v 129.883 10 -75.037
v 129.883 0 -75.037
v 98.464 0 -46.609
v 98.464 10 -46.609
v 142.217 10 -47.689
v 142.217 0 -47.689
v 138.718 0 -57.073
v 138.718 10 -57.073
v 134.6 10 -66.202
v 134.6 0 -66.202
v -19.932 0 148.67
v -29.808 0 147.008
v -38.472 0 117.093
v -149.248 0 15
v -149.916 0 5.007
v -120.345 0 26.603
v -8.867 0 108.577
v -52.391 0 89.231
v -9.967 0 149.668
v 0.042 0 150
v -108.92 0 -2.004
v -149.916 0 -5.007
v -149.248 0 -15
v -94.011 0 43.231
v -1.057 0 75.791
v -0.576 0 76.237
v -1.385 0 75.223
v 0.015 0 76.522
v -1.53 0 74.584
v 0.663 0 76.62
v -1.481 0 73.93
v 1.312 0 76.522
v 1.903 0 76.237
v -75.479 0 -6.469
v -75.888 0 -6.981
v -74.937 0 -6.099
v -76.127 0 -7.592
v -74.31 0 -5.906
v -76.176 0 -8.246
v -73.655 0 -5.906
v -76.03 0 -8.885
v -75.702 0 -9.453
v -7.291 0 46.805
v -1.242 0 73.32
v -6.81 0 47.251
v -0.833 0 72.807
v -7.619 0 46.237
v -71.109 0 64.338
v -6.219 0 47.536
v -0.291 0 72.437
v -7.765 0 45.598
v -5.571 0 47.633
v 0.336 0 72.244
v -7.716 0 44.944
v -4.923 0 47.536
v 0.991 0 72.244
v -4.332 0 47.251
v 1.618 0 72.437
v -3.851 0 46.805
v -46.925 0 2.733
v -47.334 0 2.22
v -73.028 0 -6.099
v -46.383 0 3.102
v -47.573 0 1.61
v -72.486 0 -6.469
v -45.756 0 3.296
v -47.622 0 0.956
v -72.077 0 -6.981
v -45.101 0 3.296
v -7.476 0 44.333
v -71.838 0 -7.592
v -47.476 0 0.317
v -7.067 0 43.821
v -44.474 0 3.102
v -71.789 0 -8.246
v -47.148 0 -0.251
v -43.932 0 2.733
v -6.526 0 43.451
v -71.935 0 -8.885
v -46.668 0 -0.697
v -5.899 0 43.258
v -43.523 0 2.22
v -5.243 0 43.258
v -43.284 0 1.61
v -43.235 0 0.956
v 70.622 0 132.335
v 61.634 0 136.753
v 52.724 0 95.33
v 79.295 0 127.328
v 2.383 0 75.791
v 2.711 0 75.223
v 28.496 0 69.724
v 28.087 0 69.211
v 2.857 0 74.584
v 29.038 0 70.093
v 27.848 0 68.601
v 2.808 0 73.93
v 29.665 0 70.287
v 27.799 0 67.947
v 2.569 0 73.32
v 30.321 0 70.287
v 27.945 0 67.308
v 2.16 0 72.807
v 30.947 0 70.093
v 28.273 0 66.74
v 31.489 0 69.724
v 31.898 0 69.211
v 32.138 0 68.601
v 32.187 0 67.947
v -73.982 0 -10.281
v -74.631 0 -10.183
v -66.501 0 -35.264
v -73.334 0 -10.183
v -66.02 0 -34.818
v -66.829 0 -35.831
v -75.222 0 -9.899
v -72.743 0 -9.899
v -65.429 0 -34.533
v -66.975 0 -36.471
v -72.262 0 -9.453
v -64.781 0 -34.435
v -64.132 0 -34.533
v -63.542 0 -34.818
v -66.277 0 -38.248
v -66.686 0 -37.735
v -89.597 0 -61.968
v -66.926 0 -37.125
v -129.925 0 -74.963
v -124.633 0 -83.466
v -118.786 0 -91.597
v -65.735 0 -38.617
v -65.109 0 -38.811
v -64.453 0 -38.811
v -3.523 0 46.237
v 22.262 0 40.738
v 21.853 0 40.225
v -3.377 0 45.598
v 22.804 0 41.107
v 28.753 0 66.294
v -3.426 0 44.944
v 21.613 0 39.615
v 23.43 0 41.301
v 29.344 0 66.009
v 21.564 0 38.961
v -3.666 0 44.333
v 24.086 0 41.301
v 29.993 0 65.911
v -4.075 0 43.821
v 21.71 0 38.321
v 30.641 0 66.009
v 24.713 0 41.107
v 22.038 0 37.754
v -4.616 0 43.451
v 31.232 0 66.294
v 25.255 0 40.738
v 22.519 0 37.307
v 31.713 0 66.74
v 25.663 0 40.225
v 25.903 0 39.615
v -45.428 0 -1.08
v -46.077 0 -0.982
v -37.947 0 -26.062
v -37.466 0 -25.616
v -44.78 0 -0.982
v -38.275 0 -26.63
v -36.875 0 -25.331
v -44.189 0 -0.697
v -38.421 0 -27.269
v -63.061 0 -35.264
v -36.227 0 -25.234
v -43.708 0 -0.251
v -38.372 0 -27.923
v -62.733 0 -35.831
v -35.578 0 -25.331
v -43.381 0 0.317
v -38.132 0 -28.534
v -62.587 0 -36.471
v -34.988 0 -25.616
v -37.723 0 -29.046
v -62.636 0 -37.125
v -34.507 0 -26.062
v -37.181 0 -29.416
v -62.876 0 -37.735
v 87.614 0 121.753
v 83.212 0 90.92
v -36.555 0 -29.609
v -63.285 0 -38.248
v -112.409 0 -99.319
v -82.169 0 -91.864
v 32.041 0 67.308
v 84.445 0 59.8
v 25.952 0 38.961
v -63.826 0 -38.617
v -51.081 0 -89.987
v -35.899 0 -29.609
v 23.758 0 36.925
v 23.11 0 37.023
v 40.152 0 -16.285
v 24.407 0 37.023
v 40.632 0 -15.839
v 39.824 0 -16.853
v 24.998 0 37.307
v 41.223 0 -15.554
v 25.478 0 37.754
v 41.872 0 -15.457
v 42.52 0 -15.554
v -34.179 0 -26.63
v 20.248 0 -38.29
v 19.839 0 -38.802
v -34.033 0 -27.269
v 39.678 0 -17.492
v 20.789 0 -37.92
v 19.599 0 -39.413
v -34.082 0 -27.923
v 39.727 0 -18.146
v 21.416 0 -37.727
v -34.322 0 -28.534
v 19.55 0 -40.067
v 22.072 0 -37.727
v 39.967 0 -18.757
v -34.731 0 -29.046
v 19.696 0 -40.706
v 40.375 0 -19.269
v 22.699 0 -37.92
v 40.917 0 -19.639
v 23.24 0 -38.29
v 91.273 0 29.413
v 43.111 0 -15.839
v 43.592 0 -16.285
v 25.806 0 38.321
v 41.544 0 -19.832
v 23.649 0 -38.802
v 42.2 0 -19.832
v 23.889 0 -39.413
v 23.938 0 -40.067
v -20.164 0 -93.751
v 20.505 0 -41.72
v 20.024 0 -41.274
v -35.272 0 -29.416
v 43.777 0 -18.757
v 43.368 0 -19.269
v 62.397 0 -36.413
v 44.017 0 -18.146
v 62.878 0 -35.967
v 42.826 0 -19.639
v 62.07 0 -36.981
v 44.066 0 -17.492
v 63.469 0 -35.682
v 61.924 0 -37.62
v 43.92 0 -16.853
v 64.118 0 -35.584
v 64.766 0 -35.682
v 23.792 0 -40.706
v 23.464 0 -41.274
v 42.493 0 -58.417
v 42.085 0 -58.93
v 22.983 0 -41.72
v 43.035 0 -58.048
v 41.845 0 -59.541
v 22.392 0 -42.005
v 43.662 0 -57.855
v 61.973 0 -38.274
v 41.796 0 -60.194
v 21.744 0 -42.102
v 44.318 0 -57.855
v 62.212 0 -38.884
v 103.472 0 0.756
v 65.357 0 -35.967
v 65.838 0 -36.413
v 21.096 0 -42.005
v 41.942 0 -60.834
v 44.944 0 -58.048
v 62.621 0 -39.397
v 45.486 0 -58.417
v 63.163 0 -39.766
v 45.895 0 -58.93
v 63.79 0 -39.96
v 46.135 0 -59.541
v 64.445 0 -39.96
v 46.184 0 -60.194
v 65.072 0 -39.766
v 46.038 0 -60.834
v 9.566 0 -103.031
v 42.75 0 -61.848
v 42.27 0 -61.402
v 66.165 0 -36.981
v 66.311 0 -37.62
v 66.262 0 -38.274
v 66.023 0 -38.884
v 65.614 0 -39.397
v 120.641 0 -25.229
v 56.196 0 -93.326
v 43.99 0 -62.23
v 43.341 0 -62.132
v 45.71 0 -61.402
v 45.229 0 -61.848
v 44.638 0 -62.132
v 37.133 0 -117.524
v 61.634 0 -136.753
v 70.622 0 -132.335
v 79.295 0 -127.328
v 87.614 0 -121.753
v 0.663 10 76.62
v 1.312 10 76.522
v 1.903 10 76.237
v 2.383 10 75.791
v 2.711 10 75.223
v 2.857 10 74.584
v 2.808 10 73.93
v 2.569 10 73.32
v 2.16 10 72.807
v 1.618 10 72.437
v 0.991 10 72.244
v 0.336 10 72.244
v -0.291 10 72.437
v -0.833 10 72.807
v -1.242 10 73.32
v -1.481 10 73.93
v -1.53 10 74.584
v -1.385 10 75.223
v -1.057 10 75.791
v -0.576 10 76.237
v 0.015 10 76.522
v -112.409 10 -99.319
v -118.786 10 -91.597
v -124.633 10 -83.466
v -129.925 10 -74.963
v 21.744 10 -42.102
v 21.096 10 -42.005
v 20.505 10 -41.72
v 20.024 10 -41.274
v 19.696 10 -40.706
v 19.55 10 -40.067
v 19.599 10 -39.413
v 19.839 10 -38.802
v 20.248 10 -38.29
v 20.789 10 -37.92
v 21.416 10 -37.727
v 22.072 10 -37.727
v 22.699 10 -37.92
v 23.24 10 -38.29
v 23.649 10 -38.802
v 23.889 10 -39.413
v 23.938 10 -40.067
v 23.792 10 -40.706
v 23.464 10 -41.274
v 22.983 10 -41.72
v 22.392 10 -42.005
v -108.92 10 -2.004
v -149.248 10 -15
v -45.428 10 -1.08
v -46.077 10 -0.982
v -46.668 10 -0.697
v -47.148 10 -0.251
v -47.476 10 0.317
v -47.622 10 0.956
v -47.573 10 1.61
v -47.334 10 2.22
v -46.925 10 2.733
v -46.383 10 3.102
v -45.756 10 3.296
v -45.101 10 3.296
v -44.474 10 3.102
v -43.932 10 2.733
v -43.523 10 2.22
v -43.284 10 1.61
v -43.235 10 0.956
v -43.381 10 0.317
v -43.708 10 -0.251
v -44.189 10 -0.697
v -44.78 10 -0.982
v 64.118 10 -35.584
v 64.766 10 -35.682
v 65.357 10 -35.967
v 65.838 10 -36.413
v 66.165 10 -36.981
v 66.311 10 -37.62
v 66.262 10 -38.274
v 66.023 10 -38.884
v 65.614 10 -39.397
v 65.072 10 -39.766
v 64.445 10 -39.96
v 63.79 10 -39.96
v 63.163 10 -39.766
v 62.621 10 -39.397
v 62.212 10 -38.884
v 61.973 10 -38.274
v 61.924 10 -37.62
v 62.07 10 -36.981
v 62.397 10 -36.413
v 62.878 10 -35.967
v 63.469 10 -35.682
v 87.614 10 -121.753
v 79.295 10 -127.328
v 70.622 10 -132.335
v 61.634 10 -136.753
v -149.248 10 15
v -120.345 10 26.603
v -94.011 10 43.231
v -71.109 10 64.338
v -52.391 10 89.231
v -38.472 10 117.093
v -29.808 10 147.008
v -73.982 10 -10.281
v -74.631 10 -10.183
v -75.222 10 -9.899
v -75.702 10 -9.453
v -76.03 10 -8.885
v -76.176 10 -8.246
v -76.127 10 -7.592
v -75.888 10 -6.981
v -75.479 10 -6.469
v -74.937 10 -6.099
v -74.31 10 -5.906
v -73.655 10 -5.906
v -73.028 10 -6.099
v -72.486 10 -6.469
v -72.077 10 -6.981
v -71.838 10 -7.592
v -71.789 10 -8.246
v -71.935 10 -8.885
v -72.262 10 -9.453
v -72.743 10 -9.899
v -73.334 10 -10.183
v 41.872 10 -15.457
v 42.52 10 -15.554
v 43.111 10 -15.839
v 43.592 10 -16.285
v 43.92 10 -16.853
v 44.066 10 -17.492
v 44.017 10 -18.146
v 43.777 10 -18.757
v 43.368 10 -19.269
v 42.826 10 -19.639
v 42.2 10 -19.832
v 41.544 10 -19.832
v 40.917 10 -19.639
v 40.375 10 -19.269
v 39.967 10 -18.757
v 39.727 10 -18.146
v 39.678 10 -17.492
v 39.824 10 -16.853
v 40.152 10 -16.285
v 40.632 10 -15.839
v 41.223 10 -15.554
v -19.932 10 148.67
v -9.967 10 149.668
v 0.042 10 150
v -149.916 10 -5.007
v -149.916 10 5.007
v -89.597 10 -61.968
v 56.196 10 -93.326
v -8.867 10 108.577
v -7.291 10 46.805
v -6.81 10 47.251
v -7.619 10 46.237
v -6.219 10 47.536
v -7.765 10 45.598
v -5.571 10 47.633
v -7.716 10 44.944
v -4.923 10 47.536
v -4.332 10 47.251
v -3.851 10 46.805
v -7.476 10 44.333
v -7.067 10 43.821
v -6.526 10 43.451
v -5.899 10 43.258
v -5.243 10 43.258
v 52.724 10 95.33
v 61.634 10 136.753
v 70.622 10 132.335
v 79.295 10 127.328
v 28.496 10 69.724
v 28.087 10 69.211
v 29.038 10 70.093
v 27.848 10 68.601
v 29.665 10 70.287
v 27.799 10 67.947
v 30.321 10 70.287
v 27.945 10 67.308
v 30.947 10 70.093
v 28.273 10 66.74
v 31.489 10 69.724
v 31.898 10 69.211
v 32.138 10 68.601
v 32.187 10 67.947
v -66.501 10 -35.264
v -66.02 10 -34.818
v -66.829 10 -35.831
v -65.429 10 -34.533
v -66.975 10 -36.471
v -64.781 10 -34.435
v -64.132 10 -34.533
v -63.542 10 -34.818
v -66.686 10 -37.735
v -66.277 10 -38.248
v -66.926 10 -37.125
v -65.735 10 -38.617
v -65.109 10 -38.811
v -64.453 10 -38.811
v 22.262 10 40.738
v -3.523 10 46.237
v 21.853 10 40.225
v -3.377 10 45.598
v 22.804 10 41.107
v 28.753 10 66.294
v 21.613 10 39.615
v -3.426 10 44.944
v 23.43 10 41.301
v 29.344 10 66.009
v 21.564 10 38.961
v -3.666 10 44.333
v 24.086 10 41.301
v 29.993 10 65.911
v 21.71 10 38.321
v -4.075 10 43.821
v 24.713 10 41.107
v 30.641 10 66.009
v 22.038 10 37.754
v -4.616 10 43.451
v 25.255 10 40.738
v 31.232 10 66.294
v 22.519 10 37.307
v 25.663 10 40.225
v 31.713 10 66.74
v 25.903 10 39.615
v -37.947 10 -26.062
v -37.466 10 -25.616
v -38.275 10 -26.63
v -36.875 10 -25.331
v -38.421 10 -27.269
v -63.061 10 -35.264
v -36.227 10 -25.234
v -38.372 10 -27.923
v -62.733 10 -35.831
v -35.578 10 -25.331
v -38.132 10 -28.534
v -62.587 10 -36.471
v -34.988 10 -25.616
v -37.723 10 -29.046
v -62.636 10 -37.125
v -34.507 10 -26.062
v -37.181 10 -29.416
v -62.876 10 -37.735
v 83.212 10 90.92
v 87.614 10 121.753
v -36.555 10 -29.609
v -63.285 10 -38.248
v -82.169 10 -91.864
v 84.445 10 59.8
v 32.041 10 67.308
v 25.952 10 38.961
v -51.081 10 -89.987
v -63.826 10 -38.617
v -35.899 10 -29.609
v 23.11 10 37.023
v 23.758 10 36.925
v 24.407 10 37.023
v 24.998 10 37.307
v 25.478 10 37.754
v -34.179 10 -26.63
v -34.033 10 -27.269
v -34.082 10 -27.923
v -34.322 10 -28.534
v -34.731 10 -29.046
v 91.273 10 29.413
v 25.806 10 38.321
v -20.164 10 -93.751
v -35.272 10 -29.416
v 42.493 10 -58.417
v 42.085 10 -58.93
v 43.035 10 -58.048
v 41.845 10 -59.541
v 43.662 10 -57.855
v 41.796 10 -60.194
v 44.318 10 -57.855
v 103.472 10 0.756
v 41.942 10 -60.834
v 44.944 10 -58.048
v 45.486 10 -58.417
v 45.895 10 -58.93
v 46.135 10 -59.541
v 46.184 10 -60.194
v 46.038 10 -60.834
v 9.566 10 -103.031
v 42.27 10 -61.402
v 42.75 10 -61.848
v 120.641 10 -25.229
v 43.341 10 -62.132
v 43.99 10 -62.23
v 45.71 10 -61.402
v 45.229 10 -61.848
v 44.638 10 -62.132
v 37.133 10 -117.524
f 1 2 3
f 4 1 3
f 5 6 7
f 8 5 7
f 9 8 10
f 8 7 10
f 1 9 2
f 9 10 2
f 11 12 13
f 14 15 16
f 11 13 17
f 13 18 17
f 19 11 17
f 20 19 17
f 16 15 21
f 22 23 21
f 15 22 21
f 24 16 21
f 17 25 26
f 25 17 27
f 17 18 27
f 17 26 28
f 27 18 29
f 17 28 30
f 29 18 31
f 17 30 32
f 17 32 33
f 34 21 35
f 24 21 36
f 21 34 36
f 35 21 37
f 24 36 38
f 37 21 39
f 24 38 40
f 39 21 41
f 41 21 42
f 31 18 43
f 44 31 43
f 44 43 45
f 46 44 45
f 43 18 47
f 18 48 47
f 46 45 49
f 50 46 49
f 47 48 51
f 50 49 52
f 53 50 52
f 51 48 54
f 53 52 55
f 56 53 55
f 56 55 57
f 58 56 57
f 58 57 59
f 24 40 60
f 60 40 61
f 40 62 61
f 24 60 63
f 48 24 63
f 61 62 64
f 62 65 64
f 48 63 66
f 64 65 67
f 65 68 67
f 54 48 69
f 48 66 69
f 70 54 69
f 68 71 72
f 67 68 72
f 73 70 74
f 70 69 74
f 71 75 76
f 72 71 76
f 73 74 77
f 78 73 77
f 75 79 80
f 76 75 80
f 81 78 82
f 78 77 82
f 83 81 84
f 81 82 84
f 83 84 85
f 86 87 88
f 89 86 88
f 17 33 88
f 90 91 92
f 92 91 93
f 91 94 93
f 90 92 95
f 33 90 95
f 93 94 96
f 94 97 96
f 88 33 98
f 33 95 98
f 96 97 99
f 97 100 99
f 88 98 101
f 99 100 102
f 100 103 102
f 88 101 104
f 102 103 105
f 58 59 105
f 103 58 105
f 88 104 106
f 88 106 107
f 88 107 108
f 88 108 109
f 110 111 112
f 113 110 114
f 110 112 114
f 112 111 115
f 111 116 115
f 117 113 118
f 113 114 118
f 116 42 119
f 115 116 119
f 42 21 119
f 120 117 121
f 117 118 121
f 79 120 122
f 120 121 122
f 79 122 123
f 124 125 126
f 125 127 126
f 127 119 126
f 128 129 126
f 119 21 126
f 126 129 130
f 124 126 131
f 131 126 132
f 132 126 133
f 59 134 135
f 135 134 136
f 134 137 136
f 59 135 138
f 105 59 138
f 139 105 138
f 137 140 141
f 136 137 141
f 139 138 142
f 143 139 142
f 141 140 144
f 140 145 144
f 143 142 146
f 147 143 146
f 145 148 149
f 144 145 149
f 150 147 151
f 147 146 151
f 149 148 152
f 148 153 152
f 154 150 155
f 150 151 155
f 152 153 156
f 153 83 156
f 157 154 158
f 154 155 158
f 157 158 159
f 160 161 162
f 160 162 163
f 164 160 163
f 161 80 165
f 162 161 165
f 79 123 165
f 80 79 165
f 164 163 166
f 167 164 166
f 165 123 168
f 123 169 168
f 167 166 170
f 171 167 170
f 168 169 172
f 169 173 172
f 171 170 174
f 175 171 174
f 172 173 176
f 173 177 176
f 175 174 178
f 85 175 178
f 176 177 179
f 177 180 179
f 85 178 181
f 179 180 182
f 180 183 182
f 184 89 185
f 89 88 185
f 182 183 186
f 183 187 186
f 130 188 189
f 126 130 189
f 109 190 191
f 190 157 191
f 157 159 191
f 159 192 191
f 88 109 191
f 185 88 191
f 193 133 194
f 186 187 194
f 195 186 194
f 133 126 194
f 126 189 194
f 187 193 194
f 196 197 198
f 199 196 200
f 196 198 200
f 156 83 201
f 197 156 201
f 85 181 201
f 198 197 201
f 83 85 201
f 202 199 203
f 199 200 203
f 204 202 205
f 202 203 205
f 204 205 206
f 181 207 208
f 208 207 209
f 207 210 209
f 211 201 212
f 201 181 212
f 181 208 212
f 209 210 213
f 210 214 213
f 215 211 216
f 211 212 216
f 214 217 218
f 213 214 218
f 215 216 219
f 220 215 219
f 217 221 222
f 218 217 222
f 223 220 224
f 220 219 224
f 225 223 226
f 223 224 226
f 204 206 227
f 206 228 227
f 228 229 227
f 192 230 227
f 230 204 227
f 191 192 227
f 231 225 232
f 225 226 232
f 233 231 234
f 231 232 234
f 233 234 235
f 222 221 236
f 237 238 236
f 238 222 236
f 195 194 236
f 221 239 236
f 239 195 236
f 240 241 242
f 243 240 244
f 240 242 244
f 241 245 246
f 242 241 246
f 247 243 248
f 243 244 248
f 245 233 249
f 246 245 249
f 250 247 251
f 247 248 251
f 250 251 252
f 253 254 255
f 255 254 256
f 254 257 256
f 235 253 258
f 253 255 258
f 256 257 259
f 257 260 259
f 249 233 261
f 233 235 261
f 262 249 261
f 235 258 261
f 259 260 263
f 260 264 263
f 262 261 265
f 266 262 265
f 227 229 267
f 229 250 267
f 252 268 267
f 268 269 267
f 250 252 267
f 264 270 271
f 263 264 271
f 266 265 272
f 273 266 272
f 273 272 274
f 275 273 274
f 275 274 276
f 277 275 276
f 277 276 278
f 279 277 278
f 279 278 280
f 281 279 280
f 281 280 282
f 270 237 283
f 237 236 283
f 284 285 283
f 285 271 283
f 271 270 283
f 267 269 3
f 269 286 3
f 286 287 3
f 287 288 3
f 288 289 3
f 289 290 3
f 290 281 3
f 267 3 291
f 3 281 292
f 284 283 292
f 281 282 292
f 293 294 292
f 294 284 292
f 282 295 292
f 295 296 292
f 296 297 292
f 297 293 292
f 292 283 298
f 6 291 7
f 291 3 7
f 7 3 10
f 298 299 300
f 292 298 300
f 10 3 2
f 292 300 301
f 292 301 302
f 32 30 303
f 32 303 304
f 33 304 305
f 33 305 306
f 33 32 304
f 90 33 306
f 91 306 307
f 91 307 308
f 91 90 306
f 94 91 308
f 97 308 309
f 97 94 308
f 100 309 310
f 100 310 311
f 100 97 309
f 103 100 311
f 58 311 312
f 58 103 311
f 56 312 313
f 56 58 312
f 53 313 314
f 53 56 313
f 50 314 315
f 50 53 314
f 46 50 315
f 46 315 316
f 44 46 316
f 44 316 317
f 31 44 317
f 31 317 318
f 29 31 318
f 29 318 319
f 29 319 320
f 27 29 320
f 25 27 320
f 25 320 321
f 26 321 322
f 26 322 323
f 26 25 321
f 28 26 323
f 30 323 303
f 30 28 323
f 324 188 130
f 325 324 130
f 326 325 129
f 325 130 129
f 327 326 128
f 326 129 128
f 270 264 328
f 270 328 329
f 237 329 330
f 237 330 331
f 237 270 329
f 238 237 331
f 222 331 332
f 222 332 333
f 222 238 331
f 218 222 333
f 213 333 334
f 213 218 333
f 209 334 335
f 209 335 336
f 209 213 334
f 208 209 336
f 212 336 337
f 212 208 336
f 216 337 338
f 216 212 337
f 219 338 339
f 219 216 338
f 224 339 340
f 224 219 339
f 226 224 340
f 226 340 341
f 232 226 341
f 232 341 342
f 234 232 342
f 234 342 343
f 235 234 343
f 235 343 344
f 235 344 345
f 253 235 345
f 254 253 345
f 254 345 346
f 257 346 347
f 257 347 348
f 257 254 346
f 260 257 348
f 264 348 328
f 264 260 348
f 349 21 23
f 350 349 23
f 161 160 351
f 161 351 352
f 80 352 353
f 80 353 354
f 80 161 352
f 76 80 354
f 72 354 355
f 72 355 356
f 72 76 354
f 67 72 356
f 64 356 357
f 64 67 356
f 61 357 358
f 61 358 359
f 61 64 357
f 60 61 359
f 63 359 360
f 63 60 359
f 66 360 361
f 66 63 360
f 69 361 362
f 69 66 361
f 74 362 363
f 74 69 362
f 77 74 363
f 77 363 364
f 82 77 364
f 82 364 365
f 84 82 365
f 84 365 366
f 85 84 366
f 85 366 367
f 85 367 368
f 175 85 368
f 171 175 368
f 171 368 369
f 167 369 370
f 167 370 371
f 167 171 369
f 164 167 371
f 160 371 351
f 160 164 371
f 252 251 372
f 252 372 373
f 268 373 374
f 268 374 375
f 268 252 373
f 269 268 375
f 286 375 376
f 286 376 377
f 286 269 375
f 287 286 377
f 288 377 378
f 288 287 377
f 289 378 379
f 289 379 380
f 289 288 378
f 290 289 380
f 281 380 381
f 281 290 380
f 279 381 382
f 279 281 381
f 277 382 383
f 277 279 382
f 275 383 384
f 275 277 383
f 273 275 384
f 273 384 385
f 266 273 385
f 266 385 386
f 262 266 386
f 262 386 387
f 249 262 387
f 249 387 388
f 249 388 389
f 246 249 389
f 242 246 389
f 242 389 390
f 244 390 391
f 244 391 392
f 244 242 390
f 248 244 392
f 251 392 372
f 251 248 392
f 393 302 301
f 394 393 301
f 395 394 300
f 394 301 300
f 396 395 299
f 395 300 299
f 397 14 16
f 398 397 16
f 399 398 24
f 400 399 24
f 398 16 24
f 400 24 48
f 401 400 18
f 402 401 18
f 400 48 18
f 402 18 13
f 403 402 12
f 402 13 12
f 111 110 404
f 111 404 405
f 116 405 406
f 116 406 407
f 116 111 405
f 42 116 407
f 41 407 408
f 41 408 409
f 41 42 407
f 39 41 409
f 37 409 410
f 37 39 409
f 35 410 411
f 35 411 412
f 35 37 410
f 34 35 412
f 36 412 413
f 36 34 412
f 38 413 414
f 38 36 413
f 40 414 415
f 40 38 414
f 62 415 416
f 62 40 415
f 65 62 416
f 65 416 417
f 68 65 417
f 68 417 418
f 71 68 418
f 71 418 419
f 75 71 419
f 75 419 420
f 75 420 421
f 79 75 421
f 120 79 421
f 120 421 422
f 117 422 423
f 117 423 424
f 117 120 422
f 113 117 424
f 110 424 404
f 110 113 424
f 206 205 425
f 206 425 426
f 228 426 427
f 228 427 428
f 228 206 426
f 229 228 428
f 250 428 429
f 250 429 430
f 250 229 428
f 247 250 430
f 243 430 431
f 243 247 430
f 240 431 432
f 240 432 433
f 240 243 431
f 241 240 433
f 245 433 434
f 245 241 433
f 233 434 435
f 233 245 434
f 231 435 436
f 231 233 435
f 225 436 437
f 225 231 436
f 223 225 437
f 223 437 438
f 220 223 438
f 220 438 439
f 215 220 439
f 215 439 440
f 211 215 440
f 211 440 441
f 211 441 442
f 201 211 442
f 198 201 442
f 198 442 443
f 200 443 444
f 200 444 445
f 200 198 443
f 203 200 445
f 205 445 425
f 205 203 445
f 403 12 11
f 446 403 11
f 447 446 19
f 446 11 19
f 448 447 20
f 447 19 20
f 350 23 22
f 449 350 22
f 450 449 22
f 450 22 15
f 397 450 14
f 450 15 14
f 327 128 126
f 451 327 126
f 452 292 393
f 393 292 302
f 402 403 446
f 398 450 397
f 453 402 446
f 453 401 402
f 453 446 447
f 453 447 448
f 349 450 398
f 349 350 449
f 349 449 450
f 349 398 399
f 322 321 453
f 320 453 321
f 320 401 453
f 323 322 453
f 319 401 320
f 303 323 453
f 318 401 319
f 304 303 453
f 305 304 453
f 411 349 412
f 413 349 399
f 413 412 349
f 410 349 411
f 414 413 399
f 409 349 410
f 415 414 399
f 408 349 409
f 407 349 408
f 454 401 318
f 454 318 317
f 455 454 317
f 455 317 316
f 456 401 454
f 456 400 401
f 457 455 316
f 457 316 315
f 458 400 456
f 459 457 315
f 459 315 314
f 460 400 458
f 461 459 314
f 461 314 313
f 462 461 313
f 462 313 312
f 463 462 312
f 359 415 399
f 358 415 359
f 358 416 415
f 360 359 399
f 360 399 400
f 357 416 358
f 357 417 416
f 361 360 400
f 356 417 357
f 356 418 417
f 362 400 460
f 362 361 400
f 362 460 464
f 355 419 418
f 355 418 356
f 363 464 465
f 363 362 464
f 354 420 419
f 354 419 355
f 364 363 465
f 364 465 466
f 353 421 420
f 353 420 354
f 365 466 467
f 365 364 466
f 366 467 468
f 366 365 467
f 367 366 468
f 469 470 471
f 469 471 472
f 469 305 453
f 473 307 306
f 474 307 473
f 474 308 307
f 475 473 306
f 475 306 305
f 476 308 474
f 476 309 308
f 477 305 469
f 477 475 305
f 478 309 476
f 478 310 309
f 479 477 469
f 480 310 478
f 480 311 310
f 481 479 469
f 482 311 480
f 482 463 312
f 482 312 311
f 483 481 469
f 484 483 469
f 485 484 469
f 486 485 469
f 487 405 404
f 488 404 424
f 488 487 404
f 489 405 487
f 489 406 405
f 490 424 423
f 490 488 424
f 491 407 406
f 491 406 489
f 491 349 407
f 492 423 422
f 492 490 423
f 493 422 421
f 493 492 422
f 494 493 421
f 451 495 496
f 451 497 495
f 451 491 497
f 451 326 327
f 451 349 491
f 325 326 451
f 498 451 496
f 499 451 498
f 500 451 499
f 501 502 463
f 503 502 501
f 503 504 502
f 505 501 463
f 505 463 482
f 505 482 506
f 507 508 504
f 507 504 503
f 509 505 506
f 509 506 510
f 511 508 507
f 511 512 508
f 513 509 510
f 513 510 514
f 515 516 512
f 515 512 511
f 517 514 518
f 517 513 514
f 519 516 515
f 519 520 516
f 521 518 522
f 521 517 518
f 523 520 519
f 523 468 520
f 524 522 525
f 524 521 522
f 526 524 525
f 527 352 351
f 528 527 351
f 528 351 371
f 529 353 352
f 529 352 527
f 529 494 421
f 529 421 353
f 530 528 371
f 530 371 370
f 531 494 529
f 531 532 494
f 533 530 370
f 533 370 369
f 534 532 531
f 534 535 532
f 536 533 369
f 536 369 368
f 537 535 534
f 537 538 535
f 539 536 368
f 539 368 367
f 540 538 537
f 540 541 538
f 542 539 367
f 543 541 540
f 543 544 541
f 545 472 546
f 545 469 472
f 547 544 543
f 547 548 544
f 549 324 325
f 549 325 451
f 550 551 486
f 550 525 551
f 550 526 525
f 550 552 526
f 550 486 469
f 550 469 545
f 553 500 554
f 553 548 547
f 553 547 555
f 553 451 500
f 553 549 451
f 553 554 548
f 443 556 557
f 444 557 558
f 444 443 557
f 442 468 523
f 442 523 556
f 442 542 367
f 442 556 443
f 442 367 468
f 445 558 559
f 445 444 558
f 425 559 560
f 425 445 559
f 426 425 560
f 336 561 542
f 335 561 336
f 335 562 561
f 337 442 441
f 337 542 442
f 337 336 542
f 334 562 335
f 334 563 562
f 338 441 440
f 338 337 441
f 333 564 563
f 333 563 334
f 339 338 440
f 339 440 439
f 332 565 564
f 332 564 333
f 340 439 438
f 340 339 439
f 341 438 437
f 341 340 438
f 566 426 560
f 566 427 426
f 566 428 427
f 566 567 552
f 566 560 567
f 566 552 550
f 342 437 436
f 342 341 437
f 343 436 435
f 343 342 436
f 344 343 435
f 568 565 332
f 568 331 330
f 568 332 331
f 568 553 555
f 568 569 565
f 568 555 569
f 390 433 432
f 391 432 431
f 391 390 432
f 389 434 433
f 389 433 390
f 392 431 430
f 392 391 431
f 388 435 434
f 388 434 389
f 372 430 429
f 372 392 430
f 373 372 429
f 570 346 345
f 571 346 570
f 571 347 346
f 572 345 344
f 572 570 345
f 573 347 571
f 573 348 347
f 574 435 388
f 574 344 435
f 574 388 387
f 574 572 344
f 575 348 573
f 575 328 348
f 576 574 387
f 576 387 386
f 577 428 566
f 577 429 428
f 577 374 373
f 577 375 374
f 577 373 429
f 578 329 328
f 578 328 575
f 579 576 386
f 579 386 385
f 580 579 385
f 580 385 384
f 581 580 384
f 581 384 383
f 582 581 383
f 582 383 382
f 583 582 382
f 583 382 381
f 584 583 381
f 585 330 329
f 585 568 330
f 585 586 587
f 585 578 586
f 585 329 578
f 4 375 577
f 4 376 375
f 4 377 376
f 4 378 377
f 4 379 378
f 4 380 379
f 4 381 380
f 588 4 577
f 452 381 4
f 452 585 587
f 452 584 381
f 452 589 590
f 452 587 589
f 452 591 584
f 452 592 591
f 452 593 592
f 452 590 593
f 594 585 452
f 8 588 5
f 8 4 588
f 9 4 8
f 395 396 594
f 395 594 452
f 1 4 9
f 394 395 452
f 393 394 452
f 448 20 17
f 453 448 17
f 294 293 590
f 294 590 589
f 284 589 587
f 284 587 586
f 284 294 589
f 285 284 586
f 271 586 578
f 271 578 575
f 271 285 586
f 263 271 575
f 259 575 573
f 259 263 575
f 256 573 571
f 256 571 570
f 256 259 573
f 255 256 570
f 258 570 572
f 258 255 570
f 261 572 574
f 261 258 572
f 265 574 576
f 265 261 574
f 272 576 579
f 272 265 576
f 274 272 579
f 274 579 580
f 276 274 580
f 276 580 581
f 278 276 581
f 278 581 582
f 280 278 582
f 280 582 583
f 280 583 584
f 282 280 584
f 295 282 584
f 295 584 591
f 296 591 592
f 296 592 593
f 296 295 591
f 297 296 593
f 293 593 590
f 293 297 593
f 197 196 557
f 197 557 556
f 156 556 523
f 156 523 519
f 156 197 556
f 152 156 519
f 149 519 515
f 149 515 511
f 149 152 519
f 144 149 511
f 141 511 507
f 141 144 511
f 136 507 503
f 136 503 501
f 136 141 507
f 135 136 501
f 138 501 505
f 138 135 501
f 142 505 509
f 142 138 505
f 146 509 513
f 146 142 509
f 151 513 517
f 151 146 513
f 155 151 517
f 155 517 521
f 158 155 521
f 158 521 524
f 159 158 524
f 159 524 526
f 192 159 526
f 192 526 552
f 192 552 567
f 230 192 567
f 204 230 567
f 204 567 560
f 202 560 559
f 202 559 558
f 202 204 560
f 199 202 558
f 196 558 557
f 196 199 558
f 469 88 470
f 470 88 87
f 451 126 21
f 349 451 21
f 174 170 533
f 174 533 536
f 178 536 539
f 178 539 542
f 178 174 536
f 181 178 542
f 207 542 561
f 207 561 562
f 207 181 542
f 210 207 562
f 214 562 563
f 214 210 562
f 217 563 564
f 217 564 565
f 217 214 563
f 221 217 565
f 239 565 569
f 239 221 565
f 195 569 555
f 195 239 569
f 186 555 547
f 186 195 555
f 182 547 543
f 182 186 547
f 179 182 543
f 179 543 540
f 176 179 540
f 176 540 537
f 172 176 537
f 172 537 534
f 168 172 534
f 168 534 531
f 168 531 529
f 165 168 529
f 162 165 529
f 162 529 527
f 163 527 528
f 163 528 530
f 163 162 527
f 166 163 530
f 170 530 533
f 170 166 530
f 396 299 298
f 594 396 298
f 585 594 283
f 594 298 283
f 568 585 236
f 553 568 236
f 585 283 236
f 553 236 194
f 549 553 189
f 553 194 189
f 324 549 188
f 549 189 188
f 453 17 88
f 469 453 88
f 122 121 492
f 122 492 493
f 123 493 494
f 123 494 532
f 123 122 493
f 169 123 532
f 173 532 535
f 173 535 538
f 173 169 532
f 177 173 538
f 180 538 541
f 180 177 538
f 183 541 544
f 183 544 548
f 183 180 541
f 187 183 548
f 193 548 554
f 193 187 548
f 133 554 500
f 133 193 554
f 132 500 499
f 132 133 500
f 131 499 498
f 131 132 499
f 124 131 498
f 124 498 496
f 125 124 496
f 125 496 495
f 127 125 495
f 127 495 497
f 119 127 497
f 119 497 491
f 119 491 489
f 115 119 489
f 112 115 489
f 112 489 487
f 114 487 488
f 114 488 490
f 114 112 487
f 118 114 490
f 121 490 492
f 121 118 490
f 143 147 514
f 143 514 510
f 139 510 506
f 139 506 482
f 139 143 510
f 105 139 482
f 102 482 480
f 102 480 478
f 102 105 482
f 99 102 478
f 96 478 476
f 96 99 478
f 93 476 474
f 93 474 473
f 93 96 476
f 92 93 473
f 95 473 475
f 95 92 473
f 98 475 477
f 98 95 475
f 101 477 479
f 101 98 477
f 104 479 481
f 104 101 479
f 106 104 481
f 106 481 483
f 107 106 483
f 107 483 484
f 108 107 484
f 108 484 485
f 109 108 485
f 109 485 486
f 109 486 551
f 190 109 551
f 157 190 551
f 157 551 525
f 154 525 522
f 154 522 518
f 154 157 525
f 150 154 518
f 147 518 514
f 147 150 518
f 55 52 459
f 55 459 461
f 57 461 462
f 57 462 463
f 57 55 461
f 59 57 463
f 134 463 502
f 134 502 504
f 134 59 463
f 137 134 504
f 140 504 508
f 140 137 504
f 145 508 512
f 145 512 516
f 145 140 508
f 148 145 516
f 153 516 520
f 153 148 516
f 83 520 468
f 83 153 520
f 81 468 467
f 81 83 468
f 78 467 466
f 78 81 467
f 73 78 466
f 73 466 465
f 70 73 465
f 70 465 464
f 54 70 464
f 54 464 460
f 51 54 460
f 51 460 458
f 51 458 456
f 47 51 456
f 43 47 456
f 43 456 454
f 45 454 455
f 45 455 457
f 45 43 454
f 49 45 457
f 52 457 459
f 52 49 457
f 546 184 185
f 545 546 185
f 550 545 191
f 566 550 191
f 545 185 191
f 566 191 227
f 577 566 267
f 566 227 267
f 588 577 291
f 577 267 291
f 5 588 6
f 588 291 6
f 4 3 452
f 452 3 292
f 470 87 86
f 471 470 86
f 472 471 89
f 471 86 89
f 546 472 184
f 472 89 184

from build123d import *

# Parameters (mm, degrees)
ESQUISSE1_R        = 2.2
BOSS_EXTRU_1_DEPTH = 10


with BuildPart() as part:
    # Esquisse1 → Boss.-Extru.1 (new body)
    with BuildSketch(Plane(origin=(0, 0, 0), x_dir=(1, 0, 0), z_dir=(0, 1, 0))):
        with BuildLine():
            Line((0.042215238, -149.99999406), (-8.86714291, -108.577292103))
            Line((-8.86714291, -108.577292103), (52.724318579, -95.32995759))
            Line((52.724318579, -95.32995759), (61.633676726, -136.752659547))
            ThreePointArc((61.633676726, -136.752659547), (75, -129.903810568), (87.61443884, -121.752659547))
            ThreePointArc((87.61443884, -121.752659547), (91.272869966, -29.412659164), (142.217130056, 47.689494845))
            ThreePointArc((142.217130056, 47.689494845), (136.735308263, 61.672161259), (129.882697804, 75.036556498))
            Line((129.882697804, 75.036556498), (98.46426469, 46.609475032))
            Line((98.46426469, 46.609475032), (56.196005726, 93.325578082))
            Line((56.196005726, 93.325578082), (87.61443884, 121.752659547))
            ThreePointArc((87.61443884, 121.752659547), (75, 129.903810568), (61.633676726, 136.752659547))
            ThreePointArc((61.633676726, 136.752659547), (-20.164324954, 93.750953649), (-112.408879058, 99.318900059))
            ThreePointArc((-112.408879058, 99.318900059), (-121.777312488, 87.58016992), (-129.924913042, 74.963437562))
            Line((-129.924913042, 74.963437562), (-89.59712178, 61.96781707))
            Line((-89.59712178, 61.96781707), (-108.920324304, 2.004379509))
            Line((-108.920324304, 2.004379509), (-149.248115566, 15))
            ThreePointArc((-149.248115566, 15), (-150, 0), (-149.248115566, -15))
            ThreePointArc((-149.248115566, -15), (-71.108545012, -64.338294485), (-29.808250998, -147.008394905))
            ThreePointArc((-29.808250998, -147.008394905), (-14.957995775, -149.252331179), (0.042215238, -149.99999406))
        make_face()
        with Locations(Location((-5.571030795, -45.433447067, 0), (0, 0, 270))):
            Circle(ESQUISSE1_R, mode=Mode.SUBTRACT)
        with Locations(Location((0.663417157, -74.419562014, 0), (0, 0, 270))):
            Circle(ESQUISSE1_R, mode=Mode.SUBTRACT)
        with Locations(Location((29.992684533, -68.111307484, 0), (0, 0, 90))):
            Circle(ESQUISSE1_R, mode=Mode.SUBTRACT)
        with Locations(Location((23.758236581, -39.125192537, 0), (0, 0, 90))):
            Circle(ESQUISSE1_R, mode=Mode.SUBTRACT)
        with Locations(Location((41.871759308, 17.656574754, 0), (0, 0, 270))):
            Circle(ESQUISSE1_R, mode=Mode.SUBTRACT)
        with Locations(Location((64.117522664, 37.784317118, 0), (0, 0, 270))):
            Circle(ESQUISSE1_R, mode=Mode.SUBTRACT)
        with Locations(Location((43.9897803, 60.030080475, 0), (0, 0, 90))):
            Circle(ESQUISSE1_R, mode=Mode.SUBTRACT)
        with Locations(Location((21.744016943, 39.902338111, 0), (0, 0, 90))):
            Circle(ESQUISSE1_R, mode=Mode.SUBTRACT)
        with Locations(Location((-36.226921935, 27.433719884, 0), (0, 0, 270))):
            Circle(ESQUISSE1_R, mode=Mode.SUBTRACT)
        with Locations(Location((-64.780939821, 36.635244896, 0), (0, 0, 270))):
            Circle(ESQUISSE1_R, mode=Mode.SUBTRACT)
        with Locations(Location((-73.982464833, 8.081227009, 0), (0, 0, 90))):
            Circle(ESQUISSE1_R, mode=Mode.SUBTRACT)
        with Locations(Location((-45.428446946, -1.120298002, 0), (0, 0, 90))):
            Circle(ESQUISSE1_R, mode=Mode.SUBTRACT)
    extrude(amount=BOSS_EXTRU_1_DEPTH)


solid = part.part
